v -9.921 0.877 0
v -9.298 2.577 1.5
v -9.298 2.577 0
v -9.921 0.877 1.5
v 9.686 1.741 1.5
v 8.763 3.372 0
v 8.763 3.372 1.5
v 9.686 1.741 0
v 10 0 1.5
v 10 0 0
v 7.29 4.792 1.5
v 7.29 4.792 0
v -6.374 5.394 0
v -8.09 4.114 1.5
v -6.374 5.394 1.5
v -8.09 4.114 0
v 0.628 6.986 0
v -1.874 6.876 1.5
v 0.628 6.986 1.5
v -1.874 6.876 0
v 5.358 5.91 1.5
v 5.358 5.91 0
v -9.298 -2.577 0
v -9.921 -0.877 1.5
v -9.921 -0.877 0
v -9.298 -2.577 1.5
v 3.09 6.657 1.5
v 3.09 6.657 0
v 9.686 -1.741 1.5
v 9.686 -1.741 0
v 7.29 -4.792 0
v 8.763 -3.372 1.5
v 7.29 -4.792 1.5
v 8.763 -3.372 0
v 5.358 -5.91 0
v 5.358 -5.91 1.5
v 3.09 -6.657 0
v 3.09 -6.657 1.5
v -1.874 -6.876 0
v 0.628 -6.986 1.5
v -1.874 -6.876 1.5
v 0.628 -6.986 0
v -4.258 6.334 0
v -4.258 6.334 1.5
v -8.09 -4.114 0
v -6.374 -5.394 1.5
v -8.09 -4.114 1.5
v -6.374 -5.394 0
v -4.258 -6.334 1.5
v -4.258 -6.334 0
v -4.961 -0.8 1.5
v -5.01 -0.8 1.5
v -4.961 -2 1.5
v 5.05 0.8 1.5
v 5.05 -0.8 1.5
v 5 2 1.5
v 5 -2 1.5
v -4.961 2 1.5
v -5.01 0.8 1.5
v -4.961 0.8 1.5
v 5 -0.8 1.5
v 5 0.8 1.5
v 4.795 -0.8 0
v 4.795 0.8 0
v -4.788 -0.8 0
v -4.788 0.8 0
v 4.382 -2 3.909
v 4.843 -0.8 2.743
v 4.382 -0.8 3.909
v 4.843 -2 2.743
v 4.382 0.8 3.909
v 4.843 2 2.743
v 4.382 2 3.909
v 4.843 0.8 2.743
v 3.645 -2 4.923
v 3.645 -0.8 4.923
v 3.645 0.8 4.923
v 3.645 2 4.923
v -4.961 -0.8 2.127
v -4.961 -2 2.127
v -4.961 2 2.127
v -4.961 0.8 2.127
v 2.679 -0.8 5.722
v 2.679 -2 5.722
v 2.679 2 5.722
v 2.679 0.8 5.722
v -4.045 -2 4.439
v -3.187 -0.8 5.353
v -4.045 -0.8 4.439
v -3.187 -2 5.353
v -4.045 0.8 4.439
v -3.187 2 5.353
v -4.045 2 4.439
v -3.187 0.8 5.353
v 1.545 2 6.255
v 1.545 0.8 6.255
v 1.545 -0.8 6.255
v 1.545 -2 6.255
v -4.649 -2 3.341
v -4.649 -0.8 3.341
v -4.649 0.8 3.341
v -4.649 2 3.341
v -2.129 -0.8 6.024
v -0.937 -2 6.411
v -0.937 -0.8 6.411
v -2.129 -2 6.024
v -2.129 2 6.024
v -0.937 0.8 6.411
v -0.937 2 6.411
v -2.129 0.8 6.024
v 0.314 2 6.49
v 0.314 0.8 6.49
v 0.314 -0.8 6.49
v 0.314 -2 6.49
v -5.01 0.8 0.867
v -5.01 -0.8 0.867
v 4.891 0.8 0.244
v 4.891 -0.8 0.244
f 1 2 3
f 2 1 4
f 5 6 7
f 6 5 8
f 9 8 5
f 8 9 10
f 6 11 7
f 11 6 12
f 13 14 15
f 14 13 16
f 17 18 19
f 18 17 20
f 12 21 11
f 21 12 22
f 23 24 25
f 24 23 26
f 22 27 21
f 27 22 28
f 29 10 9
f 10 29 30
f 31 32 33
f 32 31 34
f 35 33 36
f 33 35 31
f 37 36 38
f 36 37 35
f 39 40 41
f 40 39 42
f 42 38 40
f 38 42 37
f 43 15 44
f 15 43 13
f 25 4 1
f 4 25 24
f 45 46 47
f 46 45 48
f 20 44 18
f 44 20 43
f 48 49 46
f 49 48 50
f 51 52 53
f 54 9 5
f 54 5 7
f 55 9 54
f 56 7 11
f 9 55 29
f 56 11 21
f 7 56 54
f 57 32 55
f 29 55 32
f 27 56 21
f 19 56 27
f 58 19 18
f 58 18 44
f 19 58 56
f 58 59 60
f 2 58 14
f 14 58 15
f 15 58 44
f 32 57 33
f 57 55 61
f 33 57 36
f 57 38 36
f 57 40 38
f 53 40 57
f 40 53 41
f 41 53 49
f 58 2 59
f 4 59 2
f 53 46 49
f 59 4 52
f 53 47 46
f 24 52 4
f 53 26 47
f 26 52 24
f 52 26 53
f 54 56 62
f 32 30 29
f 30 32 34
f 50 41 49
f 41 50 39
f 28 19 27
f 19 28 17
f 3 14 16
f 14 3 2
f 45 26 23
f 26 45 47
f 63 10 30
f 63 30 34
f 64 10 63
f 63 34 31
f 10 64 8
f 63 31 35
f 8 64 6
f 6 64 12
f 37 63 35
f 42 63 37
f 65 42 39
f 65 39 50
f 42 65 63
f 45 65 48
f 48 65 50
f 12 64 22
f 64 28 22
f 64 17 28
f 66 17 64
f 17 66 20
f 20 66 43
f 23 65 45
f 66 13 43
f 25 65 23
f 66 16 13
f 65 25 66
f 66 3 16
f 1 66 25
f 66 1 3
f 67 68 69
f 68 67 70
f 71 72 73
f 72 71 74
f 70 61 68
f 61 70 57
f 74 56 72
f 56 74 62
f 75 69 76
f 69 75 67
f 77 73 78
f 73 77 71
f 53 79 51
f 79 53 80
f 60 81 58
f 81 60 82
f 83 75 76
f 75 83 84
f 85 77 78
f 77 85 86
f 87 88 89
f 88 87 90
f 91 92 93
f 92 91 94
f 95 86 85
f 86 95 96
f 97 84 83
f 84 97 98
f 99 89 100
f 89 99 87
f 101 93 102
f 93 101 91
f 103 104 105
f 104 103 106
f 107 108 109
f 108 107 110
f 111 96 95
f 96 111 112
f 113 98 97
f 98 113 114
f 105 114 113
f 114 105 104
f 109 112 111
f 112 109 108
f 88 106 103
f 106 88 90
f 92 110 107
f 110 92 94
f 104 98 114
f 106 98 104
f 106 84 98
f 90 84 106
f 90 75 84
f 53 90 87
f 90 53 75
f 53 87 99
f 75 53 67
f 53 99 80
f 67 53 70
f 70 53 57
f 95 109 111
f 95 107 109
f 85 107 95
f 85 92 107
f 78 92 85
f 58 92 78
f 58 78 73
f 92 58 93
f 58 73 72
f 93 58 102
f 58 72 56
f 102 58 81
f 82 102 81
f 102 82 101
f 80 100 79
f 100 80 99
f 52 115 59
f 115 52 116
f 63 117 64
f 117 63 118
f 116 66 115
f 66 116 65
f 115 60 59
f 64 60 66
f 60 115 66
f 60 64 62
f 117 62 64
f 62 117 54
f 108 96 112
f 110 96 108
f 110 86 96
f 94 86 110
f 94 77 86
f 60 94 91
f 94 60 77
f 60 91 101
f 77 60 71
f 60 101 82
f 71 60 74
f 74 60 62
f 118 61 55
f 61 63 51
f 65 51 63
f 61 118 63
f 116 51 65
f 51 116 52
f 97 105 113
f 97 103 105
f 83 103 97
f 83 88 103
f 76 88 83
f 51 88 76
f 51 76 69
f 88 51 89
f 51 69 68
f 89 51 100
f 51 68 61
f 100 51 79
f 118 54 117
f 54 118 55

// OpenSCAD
/*
 * Simple Display Stand, v1.0
 *
 * by Alex Franke (CodeCreations), Jun 2012
 * http://www.theFrankes.com
 * 
 * Licenced under Creative Commons Attribution - Non-Commercial - Share Alike 3.0 
 * 
 * DESCRIPTION: This simple display stand was modeled after one included with a 
 *   box of Shrinky Dinks toys (http://www.shrinkydinks.com/ -- You should go out and
 *   buy lots of these, because they're loads of fun and the kids will have a blast!)
 *   The default size will fit a standard shrunken Shrinky Dinks piece. It's parametric, 
 *   though, so you can change the size to fit other stuff as well. 
 * 
 * INSTRUCTIONS: Choose some values in the "User-defined values" section, render,
 *   and print.  
 * 
 * v1.0, Jun 8, 2012: Initial Release.
 * 
 * TODO: 
 *   * nothing yet...  
 */

/////////////////////////////////////////////////////////////////////////////
// User-defined values... 
/////////////////////////////////////////////////////////////////////////////
baseThickness = 1.5;   // The thickness of the base
baseWidth = 14;        // The width of the base oval 
baseLength = 20;       // The length of the base oval

tabThickness = 1.2;    // The thickness of each vertical "tab"
tabRadius = 5;         // The radius of the vertical tabs. 
tabSeparation = 1.6;   // How far apart the tabs are 

$fn=25;                // Quality of circles 


/////////////////////////////////////////////////////////////////////////////
// The code... 
/////////////////////////////////////////////////////////////////////////////
rotate([90,0,0]) 
difference() {
	union() {
		rotate([-90,0,0]) 
			translate([0,0,baseThickness/2]) 
				scale([baseLength/baseWidth,1,1])
					cylinder(h=baseThickness, r=baseWidth/2, center=true) ;

		translate([0,baseThickness,0]) 
			cylinder(h=(tabThickness*2)+tabSeparation, r=tabRadius, center=true);
	}	

	// cut groove a bit bigger so it renders well 
	translate([0,baseThickness,0]) 
		cylinder(h=tabSeparation, r=tabRadius * 1.01, center=true); 

	// remove bottom 
	rotate([-90,0,0]) 
		translate([0,0,-tabRadius/2] ) 
			scale([baseLength/baseWidth,1,1])
				cylinder(h=tabRadius, r=baseWidth/2, center=true) ;
}
